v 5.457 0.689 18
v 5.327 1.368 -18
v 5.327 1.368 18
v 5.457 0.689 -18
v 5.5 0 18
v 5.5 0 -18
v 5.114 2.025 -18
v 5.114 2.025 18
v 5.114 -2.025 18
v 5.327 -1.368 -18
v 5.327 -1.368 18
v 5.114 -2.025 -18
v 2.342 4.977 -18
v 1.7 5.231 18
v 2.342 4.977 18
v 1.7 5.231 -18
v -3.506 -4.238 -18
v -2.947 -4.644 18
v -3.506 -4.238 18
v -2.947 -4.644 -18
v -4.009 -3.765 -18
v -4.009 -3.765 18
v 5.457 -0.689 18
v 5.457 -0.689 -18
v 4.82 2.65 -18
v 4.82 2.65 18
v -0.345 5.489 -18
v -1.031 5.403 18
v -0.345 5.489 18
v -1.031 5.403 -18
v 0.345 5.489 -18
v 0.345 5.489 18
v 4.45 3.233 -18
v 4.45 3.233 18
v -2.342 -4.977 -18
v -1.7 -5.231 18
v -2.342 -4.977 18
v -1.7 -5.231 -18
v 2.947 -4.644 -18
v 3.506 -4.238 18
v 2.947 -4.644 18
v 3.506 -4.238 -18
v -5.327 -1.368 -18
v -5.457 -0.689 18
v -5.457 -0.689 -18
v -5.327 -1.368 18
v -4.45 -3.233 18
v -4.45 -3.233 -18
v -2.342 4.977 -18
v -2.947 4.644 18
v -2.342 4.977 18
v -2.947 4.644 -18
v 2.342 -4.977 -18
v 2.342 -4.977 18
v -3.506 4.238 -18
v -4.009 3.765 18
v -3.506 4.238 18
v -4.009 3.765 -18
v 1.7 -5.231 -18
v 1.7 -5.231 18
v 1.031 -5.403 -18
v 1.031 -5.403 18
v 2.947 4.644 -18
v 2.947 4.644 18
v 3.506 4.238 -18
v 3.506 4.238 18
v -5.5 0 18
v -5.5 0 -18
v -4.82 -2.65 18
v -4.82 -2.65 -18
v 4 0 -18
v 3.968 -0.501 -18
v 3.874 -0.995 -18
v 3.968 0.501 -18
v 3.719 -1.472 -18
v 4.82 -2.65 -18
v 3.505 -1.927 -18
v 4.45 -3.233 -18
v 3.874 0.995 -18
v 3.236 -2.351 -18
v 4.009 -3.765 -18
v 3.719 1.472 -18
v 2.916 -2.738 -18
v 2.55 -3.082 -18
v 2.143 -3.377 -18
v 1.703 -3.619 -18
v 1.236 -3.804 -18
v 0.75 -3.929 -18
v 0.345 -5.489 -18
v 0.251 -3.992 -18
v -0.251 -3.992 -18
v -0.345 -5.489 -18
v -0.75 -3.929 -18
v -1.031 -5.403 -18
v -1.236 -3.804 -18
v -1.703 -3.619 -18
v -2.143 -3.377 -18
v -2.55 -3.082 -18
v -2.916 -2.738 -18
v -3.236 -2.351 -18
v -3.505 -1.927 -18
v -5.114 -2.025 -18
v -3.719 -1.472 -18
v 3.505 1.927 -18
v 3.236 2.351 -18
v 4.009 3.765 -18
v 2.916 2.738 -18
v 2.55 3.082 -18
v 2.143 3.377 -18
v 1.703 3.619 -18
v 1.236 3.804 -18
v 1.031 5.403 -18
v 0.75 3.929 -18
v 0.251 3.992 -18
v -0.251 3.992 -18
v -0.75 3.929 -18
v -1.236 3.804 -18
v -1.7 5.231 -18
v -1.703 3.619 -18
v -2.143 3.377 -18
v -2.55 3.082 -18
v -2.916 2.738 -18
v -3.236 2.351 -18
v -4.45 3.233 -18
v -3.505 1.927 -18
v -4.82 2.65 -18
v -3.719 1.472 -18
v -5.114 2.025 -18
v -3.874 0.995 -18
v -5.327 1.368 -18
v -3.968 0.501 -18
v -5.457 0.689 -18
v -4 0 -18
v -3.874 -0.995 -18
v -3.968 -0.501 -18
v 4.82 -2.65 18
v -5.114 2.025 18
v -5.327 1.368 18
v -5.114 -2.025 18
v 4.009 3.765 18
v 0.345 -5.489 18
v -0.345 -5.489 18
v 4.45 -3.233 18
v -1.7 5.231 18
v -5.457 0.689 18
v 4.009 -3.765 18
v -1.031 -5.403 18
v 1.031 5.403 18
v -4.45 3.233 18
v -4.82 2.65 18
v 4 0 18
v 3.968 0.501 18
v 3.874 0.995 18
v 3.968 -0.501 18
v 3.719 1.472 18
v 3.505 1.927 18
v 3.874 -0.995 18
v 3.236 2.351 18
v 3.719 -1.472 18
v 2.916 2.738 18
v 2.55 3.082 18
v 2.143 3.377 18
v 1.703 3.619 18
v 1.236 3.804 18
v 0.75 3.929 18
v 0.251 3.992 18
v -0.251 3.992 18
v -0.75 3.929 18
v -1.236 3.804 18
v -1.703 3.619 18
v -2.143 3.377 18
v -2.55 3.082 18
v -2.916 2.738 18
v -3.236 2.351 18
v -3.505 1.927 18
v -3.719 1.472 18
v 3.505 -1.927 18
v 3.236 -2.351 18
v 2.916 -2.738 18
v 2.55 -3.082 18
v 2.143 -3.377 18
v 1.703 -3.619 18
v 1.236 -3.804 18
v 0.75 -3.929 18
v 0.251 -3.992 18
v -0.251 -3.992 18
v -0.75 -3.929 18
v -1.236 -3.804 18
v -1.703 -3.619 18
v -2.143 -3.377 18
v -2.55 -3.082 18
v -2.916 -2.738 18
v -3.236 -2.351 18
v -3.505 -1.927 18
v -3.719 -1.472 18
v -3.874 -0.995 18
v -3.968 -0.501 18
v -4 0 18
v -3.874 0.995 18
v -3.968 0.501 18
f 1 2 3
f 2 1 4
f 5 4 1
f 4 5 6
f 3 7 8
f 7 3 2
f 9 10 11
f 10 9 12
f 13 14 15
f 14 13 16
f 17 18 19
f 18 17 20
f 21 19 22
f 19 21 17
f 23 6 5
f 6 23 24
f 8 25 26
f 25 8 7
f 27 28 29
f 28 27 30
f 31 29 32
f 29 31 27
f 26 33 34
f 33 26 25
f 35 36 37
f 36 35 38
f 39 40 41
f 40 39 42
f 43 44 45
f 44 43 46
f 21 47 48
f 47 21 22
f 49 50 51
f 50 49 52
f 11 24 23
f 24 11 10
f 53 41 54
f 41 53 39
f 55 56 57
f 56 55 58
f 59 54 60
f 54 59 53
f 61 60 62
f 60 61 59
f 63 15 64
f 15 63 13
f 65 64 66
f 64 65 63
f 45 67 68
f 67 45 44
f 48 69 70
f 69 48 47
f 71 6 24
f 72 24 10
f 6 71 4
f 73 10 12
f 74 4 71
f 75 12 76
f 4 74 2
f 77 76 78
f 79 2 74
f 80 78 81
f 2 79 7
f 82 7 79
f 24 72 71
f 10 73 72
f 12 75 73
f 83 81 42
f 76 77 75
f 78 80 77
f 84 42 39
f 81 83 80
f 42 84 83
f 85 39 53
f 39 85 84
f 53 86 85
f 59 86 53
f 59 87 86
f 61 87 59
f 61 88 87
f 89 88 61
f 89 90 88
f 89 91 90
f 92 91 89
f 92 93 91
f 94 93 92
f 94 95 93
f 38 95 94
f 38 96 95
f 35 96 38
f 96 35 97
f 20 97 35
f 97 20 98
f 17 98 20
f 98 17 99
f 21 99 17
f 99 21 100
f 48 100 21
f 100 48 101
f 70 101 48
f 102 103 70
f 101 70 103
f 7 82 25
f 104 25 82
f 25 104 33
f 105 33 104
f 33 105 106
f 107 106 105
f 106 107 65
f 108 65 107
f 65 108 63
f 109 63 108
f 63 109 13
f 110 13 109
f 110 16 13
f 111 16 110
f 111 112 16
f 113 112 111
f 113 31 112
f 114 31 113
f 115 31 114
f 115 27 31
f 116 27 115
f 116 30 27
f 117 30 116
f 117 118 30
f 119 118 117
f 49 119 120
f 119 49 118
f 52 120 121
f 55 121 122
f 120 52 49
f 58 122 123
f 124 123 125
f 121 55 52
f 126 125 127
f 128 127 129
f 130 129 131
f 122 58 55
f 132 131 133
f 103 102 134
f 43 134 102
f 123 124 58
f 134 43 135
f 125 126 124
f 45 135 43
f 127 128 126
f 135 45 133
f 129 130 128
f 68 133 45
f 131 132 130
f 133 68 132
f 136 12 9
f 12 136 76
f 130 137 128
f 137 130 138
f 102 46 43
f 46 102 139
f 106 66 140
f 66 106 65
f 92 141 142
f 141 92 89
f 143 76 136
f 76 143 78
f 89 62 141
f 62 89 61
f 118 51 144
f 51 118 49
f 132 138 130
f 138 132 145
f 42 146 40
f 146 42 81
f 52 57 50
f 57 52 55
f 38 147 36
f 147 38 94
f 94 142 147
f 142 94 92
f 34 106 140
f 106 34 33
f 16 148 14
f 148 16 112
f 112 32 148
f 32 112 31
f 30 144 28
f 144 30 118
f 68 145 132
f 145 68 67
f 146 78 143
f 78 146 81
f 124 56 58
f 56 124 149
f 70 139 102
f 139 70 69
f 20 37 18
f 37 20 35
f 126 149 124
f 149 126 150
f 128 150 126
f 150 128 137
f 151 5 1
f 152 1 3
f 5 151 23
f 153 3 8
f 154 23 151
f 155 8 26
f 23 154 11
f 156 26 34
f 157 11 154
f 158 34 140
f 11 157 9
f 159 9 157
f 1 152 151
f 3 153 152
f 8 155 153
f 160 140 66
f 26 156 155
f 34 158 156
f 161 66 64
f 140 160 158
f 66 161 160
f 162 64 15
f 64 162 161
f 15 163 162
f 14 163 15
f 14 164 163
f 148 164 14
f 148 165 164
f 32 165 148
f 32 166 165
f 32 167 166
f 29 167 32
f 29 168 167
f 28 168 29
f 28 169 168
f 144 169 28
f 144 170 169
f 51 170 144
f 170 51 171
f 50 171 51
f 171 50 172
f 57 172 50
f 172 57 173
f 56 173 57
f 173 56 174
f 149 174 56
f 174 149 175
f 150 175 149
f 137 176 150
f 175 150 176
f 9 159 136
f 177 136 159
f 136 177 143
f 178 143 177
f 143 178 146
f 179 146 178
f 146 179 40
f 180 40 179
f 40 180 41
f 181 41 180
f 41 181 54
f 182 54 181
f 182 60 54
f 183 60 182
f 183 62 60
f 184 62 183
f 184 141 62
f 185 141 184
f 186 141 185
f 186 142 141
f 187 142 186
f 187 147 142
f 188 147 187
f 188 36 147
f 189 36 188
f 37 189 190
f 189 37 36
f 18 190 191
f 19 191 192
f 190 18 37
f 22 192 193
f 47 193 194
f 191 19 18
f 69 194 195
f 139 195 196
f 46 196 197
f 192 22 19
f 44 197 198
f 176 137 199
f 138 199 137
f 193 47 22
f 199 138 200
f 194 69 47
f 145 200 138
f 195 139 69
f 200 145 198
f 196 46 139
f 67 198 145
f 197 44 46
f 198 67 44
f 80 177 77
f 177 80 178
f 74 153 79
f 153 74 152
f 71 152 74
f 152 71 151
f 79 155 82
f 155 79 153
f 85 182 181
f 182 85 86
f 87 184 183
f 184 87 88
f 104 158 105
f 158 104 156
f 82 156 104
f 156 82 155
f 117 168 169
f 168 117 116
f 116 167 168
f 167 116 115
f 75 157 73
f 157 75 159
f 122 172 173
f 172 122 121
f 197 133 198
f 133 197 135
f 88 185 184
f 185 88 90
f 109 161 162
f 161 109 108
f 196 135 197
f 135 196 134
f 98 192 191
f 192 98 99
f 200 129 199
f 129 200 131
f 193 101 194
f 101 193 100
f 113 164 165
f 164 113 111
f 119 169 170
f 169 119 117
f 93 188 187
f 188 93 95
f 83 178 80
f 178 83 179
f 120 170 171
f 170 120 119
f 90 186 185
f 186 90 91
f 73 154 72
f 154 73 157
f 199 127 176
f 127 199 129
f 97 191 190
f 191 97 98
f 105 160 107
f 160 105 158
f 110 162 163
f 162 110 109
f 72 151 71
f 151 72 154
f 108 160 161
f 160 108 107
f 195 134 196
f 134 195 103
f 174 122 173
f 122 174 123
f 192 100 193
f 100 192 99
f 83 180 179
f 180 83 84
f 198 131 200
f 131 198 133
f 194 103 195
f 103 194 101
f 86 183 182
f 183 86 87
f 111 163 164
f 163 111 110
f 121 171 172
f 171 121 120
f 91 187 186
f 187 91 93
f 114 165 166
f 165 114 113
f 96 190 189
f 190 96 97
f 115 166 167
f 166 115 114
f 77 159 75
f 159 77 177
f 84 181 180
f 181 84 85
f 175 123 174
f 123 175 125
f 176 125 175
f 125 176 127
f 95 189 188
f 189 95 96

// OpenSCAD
$fn = 50;


difference() {
	union() {
		translate(v = [0, 0, -18.0000000000]) {
			cylinder(h = 36, r = 5.5000000000);
		}
	}
	union() {
		translate(v = [0, 0, -100.0000000000]) {
			cylinder(h = 200, r = 4.0000000000);
		}
	}
}
